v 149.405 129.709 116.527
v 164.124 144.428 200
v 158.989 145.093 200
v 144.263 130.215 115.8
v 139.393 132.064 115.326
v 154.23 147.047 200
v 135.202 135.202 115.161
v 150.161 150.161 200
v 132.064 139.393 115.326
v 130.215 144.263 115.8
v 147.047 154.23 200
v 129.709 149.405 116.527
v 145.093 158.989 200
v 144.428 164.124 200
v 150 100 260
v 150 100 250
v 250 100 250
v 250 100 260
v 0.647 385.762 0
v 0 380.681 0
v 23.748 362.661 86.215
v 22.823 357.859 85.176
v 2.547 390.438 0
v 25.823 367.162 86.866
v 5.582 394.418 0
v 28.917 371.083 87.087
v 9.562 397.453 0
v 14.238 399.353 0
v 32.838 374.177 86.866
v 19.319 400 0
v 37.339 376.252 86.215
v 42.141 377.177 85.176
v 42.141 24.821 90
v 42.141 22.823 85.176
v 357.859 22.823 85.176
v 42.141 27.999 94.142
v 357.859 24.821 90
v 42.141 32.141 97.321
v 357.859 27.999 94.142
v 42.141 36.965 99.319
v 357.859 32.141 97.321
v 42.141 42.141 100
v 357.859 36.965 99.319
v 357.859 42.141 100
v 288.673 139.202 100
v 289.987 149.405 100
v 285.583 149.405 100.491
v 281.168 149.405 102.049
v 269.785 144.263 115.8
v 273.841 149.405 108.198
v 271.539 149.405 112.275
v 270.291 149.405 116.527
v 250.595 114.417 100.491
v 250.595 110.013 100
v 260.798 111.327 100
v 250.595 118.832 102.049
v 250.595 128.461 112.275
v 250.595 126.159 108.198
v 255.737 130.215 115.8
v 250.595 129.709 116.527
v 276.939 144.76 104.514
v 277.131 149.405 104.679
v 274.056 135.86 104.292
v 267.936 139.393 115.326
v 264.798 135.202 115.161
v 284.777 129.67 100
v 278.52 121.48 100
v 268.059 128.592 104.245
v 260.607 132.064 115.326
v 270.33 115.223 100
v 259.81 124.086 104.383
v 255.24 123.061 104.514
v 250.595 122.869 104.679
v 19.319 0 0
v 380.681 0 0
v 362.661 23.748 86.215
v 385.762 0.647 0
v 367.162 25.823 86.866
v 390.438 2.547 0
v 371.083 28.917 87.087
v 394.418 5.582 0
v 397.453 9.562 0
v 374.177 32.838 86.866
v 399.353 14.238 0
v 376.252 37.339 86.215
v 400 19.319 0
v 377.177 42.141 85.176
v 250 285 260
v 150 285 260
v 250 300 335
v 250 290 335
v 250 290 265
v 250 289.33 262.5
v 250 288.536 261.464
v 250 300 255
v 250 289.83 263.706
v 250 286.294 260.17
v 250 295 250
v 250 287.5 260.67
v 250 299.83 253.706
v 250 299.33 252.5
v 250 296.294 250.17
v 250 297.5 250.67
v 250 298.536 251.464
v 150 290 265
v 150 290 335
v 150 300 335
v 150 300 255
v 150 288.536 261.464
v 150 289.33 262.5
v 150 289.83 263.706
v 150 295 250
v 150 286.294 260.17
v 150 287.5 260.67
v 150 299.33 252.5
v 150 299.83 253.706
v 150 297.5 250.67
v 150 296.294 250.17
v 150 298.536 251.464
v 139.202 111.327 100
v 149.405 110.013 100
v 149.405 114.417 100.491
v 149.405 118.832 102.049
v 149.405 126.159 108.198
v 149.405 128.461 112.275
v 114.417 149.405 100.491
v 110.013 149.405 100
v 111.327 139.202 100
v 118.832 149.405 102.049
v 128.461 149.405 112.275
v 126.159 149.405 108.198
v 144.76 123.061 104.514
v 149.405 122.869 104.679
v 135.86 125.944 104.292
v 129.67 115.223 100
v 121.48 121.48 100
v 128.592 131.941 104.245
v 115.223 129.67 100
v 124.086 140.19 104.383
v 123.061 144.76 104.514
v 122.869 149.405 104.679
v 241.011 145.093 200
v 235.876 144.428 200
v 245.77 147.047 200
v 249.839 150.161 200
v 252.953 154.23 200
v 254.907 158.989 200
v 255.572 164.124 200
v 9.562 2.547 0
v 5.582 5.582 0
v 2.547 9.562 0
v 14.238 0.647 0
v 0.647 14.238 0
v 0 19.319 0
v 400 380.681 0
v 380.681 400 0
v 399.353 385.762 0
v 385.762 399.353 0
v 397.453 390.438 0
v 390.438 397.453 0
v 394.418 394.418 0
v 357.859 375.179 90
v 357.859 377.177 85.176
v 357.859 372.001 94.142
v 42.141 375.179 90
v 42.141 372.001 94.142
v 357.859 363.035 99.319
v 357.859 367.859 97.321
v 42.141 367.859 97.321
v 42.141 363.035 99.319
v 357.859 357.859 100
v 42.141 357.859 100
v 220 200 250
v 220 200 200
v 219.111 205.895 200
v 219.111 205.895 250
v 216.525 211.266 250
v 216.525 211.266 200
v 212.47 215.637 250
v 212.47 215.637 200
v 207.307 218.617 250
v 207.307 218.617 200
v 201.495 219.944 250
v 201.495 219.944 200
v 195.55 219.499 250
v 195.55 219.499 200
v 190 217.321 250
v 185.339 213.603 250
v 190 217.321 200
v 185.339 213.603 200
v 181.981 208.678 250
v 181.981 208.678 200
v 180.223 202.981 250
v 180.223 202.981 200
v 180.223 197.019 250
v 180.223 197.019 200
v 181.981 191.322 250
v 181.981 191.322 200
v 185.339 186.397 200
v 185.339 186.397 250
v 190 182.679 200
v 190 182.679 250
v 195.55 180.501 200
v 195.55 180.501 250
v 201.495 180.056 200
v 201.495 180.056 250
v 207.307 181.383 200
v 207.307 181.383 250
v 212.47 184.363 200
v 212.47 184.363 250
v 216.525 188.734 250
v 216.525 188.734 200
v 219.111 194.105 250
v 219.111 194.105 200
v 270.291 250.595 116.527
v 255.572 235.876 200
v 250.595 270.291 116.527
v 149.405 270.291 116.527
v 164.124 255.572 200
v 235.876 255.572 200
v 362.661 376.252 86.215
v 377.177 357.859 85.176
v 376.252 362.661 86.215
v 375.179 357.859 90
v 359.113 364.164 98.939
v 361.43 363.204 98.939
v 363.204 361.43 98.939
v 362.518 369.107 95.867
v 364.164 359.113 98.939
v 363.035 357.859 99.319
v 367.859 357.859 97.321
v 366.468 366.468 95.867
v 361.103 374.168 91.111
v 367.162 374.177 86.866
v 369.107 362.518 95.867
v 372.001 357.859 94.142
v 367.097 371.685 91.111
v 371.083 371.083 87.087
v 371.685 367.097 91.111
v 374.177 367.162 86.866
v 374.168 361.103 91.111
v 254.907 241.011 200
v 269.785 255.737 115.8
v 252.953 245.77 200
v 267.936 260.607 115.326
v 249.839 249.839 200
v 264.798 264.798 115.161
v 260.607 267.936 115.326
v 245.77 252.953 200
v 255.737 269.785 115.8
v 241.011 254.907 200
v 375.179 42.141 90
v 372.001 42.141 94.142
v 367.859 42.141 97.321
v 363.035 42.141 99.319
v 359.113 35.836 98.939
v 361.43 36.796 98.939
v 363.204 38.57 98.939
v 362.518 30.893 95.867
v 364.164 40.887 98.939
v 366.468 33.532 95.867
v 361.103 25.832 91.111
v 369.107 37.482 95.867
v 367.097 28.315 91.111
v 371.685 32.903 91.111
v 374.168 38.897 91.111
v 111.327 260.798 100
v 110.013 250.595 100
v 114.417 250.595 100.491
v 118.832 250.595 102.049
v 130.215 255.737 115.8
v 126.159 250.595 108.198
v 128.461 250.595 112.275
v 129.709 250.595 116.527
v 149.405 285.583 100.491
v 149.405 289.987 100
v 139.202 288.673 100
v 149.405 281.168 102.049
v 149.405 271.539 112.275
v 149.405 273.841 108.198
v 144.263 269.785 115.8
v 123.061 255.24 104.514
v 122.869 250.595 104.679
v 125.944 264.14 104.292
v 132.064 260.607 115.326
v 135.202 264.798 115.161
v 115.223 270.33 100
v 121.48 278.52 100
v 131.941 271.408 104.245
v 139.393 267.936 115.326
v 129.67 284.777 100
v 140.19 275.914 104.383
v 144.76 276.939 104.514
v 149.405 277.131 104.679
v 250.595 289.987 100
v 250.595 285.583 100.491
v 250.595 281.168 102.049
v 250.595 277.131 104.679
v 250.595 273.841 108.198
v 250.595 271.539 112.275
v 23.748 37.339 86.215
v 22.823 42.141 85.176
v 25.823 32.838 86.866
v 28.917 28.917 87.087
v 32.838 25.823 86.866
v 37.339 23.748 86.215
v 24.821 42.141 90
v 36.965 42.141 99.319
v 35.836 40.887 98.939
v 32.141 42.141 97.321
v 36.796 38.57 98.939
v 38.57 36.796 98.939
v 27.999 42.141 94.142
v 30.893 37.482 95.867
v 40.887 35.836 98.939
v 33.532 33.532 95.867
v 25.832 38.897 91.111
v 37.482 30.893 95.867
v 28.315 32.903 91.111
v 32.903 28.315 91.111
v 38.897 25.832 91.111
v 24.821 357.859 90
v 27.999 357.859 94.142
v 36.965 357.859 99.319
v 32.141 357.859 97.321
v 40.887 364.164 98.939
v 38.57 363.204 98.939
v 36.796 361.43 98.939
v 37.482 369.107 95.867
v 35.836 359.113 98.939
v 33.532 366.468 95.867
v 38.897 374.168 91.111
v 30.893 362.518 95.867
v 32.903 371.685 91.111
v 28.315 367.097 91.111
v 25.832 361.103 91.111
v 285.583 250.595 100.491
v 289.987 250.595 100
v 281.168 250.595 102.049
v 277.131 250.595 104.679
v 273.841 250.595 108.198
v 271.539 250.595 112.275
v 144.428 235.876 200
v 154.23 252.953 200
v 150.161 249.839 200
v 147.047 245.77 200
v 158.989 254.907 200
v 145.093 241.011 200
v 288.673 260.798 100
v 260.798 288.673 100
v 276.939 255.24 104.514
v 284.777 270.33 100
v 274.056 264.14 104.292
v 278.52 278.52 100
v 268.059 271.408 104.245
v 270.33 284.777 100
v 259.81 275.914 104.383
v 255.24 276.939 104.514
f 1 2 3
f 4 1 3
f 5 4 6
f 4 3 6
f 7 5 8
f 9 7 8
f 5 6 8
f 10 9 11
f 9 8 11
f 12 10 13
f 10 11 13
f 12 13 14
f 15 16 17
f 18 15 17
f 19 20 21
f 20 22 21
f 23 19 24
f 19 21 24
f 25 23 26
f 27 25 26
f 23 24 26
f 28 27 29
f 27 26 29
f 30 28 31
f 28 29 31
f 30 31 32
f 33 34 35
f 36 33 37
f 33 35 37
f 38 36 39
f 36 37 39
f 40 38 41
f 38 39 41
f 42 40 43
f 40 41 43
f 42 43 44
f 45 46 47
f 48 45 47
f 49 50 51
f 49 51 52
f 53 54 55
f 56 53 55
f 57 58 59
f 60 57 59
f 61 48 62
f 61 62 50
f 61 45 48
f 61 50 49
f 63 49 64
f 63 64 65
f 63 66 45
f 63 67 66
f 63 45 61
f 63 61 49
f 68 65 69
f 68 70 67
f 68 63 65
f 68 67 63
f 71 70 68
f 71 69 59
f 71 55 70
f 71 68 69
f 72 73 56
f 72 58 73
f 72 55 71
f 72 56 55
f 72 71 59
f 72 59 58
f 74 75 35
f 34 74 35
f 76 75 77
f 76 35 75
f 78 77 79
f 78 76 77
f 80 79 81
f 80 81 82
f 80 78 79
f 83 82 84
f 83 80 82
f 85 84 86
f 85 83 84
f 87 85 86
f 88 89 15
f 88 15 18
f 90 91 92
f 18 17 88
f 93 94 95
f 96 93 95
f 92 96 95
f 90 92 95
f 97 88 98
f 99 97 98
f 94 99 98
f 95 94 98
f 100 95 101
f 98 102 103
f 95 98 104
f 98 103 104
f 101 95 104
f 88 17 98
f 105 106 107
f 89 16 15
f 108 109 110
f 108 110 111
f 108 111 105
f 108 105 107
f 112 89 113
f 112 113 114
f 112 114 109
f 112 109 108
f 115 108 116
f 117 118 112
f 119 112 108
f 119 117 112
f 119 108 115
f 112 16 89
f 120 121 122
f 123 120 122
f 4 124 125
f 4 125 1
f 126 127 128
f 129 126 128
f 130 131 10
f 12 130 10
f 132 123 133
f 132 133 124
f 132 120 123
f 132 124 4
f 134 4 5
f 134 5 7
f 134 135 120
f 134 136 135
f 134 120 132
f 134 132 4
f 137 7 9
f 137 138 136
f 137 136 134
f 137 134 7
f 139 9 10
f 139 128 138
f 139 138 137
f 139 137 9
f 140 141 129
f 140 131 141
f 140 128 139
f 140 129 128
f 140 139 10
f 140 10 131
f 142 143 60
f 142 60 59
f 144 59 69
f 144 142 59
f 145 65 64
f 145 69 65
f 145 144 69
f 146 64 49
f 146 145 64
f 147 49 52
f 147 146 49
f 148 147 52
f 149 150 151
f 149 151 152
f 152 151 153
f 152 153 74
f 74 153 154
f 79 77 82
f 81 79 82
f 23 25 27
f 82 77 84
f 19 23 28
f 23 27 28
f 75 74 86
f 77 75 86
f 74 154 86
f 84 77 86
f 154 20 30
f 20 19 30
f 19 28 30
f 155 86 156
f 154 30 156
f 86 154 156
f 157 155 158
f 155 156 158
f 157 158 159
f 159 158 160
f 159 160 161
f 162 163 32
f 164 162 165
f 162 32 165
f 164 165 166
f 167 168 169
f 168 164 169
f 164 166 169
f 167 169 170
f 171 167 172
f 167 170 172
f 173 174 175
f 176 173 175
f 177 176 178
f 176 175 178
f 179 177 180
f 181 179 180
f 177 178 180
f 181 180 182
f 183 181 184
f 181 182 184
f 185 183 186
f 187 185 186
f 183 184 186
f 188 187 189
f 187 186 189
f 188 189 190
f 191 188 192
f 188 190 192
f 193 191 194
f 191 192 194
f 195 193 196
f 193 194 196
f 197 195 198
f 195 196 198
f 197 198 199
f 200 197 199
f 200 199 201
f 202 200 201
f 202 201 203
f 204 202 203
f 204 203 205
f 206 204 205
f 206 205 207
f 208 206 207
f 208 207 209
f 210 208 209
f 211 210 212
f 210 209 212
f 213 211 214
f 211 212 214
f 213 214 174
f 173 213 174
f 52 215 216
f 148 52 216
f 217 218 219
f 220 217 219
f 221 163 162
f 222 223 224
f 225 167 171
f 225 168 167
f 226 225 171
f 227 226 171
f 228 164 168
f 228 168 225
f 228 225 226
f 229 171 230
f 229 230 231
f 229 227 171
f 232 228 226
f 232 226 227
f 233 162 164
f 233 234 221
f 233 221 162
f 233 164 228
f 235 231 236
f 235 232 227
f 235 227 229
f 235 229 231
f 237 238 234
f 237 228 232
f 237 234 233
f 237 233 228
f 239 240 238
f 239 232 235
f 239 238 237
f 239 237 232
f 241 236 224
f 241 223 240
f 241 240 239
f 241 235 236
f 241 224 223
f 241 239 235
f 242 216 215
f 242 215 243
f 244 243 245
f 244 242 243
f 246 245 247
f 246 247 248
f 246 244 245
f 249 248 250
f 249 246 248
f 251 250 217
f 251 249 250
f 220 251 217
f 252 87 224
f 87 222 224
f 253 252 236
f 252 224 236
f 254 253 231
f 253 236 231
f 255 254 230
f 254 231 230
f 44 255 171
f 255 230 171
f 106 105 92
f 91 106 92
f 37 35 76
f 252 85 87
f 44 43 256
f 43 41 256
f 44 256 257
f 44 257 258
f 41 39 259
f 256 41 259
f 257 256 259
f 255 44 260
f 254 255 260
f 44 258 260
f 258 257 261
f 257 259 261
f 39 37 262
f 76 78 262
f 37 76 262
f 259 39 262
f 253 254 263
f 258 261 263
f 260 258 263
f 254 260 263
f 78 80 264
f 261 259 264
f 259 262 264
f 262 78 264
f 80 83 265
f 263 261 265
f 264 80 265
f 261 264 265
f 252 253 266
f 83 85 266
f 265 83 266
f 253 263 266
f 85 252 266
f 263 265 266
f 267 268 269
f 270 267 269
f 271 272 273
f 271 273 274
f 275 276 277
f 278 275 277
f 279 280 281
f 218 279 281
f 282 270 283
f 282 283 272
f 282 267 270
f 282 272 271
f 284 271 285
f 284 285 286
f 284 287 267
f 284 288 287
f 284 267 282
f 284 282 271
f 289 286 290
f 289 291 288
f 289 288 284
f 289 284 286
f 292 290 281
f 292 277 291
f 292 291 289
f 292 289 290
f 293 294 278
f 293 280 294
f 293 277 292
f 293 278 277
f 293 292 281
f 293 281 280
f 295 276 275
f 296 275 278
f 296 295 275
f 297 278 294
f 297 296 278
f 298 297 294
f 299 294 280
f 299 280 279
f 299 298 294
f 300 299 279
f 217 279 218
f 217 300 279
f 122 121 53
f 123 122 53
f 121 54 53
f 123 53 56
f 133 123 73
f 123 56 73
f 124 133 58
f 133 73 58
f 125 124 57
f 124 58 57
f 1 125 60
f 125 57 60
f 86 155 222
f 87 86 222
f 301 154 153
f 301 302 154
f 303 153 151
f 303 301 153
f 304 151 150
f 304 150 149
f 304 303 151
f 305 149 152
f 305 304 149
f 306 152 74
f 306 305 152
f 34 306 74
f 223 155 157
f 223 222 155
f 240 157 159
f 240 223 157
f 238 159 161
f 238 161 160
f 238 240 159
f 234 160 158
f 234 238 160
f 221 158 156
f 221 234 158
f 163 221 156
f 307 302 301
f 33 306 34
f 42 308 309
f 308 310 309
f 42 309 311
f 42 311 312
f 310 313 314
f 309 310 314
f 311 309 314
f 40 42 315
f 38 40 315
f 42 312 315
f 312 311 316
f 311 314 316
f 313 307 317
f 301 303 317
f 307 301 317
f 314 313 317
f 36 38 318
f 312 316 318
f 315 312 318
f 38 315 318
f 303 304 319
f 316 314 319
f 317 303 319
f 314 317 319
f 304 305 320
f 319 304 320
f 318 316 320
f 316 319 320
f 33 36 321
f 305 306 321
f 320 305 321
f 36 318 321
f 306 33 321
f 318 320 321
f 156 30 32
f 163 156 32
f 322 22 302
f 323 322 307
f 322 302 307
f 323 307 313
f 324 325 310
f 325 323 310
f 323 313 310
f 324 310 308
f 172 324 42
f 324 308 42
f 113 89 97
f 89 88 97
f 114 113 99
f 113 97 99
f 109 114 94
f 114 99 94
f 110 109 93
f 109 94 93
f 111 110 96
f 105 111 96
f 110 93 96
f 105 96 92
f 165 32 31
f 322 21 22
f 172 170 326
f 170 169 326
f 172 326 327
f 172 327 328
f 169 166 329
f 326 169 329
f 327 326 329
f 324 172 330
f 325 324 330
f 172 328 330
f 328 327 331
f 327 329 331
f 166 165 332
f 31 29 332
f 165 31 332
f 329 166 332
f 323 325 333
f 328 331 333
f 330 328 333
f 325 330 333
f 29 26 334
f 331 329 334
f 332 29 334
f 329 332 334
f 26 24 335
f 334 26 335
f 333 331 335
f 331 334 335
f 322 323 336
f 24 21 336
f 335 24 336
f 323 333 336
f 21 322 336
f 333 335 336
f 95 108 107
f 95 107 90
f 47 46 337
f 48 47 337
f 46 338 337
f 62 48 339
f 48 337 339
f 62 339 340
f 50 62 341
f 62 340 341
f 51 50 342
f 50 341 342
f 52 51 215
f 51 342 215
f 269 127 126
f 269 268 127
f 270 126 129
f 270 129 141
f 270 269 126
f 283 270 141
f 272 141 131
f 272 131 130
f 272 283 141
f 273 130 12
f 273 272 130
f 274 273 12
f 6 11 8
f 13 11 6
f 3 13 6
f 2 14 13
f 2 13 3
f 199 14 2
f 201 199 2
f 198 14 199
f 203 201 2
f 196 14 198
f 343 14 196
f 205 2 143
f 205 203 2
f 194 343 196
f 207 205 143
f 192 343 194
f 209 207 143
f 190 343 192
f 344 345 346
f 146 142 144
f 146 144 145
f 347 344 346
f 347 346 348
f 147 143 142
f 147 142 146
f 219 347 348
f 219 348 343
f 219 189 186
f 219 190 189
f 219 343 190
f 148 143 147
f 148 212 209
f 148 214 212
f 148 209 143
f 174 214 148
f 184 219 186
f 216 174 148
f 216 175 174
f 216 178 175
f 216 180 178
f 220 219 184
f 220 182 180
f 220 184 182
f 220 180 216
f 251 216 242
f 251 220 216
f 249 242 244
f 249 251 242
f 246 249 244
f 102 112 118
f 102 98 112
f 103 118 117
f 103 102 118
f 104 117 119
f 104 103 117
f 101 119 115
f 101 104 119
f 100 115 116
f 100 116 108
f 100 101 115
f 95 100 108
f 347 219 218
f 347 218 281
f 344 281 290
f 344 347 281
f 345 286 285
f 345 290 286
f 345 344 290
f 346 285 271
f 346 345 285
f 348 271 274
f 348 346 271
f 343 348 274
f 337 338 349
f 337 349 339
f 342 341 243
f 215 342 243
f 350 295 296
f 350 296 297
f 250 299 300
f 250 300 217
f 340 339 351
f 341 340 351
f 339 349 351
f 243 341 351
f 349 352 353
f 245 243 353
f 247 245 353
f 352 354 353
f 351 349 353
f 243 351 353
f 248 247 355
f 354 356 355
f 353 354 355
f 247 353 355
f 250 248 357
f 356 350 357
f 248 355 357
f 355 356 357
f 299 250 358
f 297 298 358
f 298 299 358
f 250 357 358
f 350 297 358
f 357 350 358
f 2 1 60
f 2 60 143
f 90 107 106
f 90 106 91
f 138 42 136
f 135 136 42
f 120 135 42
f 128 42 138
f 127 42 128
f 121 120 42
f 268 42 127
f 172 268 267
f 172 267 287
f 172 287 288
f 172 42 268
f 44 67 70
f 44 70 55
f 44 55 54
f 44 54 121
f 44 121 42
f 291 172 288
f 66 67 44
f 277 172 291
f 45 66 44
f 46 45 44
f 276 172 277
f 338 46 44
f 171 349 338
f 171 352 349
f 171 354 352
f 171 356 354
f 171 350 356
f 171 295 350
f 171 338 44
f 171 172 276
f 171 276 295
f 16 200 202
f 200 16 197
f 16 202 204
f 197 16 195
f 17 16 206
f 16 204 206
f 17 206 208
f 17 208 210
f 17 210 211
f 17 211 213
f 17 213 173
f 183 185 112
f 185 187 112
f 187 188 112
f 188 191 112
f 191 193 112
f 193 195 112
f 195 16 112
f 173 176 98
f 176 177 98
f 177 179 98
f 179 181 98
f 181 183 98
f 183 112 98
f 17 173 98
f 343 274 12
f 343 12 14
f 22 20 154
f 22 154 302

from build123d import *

# Parameters (mm, degrees)
F0_W      = 400
F0_H      = 400
F1_DEPTH  = 100
F1_TAPER  = 15
F2_W      = 146.4101615138
F2_H      = 146.4101615138
F3_DEPTH  = 100
F3_TAPER  = 10
F4_R      = 20
F5_R      = 20
F6_DEPTH  = 50
F7_W      = 100
F7_H      = 200
F7_R      = 20
F8_DEPTH  = 10
F9_W      = 100
F9_H      = 10
F10_DEPTH = 75
F11_R     = 5


with BuildPart() as f1:
    # F0 (on Top) → F1 (new body)
    with BuildSketch(Plane.XY):
        with Locations((200, 200)):
            Rectangle(F0_W, F0_H)
    extrude(amount=F1_DEPTH, taper=F1_TAPER)

    # F2 (on face) → F3 (join)
    with BuildSketch(Plane.XY.offset(100)):
        with Locations((200, 200)):
            Rectangle(F2_W, F2_H)
    extrude(amount=F3_DEPTH, taper=F3_TAPER)

    # F4
    f4_edges = [f1.edges().sort_by_distance(p)[0] for p in [
        (13.39746, 13.39746, 50),
        (386.60254, 13.39746, 50),
        (13.39746, 386.60254, 50),
        (386.60254, 386.60254, 50),
        (200, 373.205081, 100),
        (26.794919, 200, 100),
        (200, 26.794919, 100),
        (373.205081, 200, 100),
        (273.205081, 200, 100),
        (200, 126.794919, 100),
        (264.388732, 135.611268, 150),
        (126.794919, 200, 100),
        (135.611268, 135.611268, 150),
        (200, 273.205081, 100),
        (264.388731, 264.388731, 150.000003),
        (135.611268, 264.388732, 150),
    ]]
    fillet(f4_edges, radius=F4_R)

    # F5 (on face) → F6 (join)
    with BuildSketch(Plane.XY.offset(200)):
        with Locations((200, 200)):
            Circle(F5_R)
    extrude(amount=F6_DEPTH)

    # F7 (on face) → F8 (join)
    with BuildSketch(Plane.XY.offset(250)):
        with Locations((200, 200)):
            Rectangle(F7_W, F7_H)
        with Locations((200, 200)):
            Circle(F7_R, mode=Mode.SUBTRACT)
        with Locations((200, 200)):
            Circle(F7_R)
    extrude(amount=F8_DEPTH)

    # F9 (on face) → F10 (join)
    with BuildSketch(Plane.XY.offset(260)):
        with Locations((200, 295)):
            Rectangle(F9_W, F9_H)
    extrude(amount=F10_DEPTH)

    # F11
    f11_edges = [f1.edges().sort_by_distance(p)[0] for p in [
        (200, 290, 260),
        (200, 300, 250),
    ]]
    fillet(f11_edges, radius=F11_R)


solid = f1.part
